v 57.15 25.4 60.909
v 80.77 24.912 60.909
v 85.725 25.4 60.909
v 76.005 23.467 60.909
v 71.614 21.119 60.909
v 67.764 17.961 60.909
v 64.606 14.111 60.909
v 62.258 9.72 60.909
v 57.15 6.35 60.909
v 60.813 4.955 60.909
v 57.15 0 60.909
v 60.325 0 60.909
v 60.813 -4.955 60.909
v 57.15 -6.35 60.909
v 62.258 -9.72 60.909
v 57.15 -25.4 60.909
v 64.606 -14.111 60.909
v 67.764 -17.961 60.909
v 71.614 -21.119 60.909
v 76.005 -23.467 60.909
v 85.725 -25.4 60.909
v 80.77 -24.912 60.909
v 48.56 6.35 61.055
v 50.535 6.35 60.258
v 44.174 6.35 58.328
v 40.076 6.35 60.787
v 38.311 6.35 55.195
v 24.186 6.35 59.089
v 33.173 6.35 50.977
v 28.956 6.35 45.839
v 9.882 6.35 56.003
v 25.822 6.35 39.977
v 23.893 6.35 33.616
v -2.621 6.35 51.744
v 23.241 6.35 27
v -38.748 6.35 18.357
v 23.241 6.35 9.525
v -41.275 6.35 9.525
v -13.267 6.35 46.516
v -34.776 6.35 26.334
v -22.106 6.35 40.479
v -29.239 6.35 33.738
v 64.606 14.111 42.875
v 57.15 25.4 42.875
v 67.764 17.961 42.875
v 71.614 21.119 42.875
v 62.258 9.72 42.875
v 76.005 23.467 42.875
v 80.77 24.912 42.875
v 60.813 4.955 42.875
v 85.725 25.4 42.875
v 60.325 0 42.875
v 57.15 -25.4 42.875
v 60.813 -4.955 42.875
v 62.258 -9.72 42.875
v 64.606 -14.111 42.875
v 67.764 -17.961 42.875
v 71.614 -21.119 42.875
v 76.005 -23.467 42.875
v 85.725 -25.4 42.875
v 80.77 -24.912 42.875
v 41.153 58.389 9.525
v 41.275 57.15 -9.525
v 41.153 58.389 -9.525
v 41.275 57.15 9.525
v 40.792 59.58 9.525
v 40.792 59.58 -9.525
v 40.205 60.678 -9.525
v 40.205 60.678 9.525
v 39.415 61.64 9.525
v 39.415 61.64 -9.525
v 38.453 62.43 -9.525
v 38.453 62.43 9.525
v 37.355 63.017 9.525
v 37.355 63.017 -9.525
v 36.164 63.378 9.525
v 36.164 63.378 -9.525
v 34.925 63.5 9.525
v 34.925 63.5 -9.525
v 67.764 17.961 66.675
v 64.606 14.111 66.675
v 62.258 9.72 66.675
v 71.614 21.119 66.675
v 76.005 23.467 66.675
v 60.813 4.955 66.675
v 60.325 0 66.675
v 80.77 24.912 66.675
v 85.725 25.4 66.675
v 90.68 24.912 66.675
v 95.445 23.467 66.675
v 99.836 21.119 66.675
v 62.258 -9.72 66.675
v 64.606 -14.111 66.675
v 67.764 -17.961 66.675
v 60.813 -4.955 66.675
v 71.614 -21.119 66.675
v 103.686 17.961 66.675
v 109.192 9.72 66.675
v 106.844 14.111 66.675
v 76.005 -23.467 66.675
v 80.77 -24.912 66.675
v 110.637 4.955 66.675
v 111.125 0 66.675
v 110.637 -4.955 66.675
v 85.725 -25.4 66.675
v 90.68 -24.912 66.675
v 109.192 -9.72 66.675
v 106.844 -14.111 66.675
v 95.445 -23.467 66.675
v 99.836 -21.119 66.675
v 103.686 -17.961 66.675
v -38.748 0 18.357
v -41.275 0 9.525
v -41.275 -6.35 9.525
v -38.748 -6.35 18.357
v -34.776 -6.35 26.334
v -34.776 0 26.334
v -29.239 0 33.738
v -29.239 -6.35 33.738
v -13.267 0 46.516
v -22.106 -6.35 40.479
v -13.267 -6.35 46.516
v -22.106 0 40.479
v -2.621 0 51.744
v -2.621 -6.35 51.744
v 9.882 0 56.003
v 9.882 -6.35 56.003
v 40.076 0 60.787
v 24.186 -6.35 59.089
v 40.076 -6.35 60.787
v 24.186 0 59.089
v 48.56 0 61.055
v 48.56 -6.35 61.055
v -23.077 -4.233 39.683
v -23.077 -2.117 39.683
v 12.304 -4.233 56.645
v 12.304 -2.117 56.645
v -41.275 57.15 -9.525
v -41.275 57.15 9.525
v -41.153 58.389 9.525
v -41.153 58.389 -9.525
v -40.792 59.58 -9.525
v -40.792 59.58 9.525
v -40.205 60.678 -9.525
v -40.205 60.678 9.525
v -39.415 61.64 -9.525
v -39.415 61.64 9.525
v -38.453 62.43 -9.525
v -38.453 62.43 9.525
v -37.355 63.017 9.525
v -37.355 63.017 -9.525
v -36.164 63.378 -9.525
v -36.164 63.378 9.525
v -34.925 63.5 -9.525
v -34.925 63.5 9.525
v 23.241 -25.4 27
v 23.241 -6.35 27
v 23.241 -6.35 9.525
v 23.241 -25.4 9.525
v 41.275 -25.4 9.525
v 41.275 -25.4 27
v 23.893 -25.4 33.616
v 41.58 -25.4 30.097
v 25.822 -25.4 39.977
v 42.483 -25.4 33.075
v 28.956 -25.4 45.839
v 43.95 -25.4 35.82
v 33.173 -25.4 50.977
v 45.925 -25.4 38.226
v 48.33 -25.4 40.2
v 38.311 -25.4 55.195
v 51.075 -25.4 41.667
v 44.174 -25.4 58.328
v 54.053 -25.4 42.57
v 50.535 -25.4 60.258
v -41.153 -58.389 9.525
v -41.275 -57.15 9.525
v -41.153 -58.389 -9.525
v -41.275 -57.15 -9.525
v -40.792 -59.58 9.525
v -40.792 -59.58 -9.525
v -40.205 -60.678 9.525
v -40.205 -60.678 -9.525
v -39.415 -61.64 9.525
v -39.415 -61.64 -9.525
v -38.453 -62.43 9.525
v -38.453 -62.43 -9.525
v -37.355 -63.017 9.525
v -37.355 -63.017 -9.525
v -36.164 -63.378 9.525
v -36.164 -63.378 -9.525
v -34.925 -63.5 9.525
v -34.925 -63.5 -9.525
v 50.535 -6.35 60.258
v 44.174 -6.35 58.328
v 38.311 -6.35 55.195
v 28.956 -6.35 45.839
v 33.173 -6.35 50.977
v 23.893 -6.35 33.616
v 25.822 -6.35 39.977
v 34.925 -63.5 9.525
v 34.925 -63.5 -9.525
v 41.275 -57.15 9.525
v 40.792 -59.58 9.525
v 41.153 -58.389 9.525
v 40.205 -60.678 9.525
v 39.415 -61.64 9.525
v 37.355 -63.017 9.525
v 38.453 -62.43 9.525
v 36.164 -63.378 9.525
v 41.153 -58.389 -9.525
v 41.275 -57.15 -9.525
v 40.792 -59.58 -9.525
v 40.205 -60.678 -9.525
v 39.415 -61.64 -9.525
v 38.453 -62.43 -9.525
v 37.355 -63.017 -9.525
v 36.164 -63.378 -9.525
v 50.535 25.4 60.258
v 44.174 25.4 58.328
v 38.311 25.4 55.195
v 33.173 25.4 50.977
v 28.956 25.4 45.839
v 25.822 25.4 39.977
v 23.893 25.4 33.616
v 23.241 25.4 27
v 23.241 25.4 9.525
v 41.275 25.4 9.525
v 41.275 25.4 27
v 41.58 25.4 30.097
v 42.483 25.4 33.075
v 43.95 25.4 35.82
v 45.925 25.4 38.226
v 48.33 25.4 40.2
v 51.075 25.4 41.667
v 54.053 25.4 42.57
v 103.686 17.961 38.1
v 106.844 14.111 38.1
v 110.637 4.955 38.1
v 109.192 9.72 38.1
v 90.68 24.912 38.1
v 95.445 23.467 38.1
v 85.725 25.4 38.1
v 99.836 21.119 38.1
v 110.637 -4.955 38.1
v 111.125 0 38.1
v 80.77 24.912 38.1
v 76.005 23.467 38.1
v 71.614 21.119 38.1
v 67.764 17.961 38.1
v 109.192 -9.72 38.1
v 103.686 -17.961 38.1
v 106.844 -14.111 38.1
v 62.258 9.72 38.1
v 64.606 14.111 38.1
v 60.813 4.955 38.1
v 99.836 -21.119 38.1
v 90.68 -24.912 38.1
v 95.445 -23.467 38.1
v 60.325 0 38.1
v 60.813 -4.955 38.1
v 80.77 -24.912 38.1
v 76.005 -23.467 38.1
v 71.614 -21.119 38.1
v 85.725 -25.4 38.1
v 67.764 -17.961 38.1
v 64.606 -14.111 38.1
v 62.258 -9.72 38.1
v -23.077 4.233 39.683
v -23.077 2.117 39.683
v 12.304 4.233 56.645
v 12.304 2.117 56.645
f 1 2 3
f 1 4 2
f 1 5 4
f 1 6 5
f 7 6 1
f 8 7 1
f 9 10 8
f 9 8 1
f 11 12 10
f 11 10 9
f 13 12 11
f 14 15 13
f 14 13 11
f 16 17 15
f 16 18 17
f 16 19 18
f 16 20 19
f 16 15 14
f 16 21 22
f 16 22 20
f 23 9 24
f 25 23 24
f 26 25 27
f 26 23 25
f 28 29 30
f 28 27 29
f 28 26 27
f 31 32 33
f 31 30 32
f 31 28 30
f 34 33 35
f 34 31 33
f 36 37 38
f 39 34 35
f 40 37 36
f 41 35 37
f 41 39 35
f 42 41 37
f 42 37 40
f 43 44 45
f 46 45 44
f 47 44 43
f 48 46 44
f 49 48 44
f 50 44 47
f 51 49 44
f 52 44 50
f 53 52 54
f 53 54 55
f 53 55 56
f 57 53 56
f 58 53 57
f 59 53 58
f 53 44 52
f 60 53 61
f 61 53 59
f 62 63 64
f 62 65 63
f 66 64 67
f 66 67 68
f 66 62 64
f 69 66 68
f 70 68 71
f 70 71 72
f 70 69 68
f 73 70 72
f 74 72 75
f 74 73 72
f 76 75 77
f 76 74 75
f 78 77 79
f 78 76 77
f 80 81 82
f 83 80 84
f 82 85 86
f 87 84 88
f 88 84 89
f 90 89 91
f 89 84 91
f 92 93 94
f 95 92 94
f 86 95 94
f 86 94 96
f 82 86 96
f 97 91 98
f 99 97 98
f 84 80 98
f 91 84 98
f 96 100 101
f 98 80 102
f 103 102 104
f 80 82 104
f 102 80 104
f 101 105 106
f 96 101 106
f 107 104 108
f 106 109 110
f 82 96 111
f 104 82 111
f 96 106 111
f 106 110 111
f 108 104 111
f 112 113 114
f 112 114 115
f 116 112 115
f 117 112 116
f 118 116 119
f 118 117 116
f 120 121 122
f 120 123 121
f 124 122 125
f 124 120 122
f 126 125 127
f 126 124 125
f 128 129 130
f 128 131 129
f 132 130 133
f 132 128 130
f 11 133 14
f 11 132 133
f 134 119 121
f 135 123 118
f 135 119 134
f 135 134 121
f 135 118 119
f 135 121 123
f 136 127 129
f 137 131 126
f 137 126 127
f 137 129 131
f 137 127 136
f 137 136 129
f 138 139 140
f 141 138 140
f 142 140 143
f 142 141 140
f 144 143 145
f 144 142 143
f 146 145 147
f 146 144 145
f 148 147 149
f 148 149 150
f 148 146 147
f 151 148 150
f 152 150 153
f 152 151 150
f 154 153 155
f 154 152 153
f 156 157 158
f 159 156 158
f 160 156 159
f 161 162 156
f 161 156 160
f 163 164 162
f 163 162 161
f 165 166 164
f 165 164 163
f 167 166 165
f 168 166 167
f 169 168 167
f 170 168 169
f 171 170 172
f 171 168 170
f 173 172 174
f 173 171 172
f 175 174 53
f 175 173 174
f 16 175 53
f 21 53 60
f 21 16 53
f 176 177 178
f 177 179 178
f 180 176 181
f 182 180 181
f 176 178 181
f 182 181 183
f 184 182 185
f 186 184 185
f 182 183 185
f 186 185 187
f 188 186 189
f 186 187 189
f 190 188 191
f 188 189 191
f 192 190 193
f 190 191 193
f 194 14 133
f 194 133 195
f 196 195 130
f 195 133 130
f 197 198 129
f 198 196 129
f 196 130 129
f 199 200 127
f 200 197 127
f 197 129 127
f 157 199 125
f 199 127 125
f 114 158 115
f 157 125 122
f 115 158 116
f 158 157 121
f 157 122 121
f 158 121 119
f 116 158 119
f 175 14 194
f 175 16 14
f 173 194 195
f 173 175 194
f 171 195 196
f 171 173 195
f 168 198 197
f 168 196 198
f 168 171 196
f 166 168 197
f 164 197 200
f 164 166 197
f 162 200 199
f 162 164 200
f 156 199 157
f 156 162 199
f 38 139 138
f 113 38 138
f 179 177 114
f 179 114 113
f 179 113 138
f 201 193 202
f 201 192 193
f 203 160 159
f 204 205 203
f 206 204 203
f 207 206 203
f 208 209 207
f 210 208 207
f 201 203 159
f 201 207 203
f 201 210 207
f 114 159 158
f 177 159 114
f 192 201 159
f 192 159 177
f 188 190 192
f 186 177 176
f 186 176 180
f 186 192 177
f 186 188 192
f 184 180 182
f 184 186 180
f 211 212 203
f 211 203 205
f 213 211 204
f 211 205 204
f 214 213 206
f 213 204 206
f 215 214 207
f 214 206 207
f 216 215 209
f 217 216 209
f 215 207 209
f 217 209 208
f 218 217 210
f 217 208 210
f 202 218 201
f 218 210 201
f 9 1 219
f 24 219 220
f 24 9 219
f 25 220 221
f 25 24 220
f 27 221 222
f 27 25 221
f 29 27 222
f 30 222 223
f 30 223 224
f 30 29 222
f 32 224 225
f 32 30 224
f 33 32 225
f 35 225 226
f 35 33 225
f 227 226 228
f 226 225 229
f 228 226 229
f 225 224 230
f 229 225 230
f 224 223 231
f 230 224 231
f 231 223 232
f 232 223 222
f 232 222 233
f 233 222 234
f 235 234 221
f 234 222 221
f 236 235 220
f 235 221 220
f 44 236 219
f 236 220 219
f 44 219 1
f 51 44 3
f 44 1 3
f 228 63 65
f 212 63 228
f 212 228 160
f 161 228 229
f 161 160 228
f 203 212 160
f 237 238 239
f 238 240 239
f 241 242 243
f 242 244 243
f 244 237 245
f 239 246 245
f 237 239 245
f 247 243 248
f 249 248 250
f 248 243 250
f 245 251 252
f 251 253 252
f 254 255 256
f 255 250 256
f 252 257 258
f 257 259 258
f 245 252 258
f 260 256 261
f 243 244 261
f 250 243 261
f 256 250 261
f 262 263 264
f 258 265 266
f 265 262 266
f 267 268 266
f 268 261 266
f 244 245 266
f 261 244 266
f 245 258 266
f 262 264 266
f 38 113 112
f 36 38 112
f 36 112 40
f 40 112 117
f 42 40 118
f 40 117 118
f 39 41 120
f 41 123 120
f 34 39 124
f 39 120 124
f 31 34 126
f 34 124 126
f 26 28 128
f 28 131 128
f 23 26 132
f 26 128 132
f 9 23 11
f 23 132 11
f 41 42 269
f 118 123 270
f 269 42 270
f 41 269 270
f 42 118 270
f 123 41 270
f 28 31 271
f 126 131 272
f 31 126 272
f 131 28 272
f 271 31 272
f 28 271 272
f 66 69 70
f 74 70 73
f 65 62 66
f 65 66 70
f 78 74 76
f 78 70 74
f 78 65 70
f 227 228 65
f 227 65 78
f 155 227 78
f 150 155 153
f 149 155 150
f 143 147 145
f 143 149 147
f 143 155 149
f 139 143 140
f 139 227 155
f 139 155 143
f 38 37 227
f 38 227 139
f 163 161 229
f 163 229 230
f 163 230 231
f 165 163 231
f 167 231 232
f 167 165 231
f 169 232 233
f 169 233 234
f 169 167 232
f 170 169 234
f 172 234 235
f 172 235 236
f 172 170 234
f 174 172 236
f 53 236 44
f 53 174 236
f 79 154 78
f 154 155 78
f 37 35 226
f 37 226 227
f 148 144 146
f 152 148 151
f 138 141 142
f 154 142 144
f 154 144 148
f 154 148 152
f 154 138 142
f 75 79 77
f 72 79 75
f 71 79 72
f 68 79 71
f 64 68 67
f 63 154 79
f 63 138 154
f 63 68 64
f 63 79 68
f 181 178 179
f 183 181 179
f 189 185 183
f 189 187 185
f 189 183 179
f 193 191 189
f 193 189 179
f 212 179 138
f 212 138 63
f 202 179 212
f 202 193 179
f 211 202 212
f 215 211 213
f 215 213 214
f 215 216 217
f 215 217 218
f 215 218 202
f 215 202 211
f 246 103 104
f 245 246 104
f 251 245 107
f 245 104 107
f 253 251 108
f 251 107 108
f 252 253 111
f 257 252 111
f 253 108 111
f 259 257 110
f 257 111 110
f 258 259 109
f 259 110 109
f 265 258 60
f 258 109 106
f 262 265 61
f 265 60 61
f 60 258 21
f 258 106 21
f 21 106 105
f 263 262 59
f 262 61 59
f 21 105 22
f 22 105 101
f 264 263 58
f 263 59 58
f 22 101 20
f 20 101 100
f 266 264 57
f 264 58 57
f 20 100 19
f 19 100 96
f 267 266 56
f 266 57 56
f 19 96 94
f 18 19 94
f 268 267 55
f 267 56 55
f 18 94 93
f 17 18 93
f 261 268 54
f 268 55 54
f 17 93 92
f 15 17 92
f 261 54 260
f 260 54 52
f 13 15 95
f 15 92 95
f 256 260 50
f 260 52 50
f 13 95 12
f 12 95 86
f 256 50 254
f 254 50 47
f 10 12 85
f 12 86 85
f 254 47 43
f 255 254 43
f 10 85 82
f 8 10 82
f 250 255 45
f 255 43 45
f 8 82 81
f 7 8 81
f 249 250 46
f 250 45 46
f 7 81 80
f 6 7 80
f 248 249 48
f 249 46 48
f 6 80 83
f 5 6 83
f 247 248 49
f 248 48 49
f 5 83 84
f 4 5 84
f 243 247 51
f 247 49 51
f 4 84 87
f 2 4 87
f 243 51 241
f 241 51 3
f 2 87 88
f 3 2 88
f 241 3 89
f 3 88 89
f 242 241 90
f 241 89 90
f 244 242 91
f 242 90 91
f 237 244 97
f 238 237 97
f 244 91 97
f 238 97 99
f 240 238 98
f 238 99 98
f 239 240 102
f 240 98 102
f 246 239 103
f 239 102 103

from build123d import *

# Parameters (mm, degrees)
F1_DEPTH = 63.5
F0_W     = 25.4
F0_H     = 18.034
F2_DEPTH = 25.4
F3_DEPTH = 6.35
F5_R     = 6.35


with BuildPart() as f1:
    # F0 (on Front) → F1 (new body, symmetric)
    with BuildSketch(Plane.XZ):
        Polygon((-41.275, 9.525), (-41.275, -9.525), (41.275, -9.525), (41.275, 9.525), (23.241, 9.525), align=None)
    extrude(amount=F1_DEPTH, both=True)

    # F0 (on Front) → F2 (join, symmetric)
    with BuildSketch(Plane.XZ):
        with BuildLine():
            Line((23.241, 9.525), (41.275, 9.525))
            Line((41.275, 9.525), (41.275, 27.0002))
            ThreePointArc((41.275, 27.0002), (45.9246798487, 38.2255201513), (57.15, 42.8752))
            Line((57.15, 42.8752), (60.325, 42.8752))
            Line((60.325, 42.8752), (60.325, 60.9092))
            Line((60.325, 60.9092), (57.15, 60.9092))
            ThreePointArc((57.15, 60.9092), (33.1727161567, 50.9774838433), (23.241, 27.0002))
            Line((23.241, 27.0002), (23.241, 9.525))
        make_face()
        with Locations((73.025, 51.8922)):
            Rectangle(F0_W, F0_H)
    extrude(amount=F2_DEPTH, both=True)

    # F0 (on Front) → F3 (join, symmetric)
    with BuildSketch(Plane.XZ):
        with BuildLine():
            add(Edge.make_bspline(
                [(-41.275, 9.525), (-34.2406501154, 46.4476686137), (10.1438477317, 62.8272760307), (57.15, 60.9092)],
                knots=[0, 0, 0, 0, 111.0307013156, 111.0307013156, 111.0307013156, 111.0307013156], degree=3))
            Line((-41.275, 9.525), (23.241, 9.525))
            Line((23.241, 9.525), (23.241, 27.0002))
            ThreePointArc((23.241, 27.0002), (33.1727161567, 50.9774838433), (57.15, 60.9092))
        make_face()
    extrude(amount=F3_DEPTH, both=True)

    # F0 (on Front) → F4 (revolve)
    with BuildSketch(Plane.XZ):
        Polygon((85.725, 66.675), (85.725, 60.9092), (85.725, 42.8752), (85.725, 38.1), (111.125, 38.1), (111.125, 66.675), align=None)
    revolve(axis=Axis((85.725, 0, 52.3875), (0, 0, -1)))

    # F5
    f5_edges = [f1.edges().sort_by_distance(p)[0] for p in [
        (-41.275, -63.5, 0),
        (41.275, -63.5, 0),
        (-41.275, 63.5, 0),
        (41.275, 63.5, 0),
    ]]
    fillet(f5_edges, radius=F5_R)


solid = f1.part
